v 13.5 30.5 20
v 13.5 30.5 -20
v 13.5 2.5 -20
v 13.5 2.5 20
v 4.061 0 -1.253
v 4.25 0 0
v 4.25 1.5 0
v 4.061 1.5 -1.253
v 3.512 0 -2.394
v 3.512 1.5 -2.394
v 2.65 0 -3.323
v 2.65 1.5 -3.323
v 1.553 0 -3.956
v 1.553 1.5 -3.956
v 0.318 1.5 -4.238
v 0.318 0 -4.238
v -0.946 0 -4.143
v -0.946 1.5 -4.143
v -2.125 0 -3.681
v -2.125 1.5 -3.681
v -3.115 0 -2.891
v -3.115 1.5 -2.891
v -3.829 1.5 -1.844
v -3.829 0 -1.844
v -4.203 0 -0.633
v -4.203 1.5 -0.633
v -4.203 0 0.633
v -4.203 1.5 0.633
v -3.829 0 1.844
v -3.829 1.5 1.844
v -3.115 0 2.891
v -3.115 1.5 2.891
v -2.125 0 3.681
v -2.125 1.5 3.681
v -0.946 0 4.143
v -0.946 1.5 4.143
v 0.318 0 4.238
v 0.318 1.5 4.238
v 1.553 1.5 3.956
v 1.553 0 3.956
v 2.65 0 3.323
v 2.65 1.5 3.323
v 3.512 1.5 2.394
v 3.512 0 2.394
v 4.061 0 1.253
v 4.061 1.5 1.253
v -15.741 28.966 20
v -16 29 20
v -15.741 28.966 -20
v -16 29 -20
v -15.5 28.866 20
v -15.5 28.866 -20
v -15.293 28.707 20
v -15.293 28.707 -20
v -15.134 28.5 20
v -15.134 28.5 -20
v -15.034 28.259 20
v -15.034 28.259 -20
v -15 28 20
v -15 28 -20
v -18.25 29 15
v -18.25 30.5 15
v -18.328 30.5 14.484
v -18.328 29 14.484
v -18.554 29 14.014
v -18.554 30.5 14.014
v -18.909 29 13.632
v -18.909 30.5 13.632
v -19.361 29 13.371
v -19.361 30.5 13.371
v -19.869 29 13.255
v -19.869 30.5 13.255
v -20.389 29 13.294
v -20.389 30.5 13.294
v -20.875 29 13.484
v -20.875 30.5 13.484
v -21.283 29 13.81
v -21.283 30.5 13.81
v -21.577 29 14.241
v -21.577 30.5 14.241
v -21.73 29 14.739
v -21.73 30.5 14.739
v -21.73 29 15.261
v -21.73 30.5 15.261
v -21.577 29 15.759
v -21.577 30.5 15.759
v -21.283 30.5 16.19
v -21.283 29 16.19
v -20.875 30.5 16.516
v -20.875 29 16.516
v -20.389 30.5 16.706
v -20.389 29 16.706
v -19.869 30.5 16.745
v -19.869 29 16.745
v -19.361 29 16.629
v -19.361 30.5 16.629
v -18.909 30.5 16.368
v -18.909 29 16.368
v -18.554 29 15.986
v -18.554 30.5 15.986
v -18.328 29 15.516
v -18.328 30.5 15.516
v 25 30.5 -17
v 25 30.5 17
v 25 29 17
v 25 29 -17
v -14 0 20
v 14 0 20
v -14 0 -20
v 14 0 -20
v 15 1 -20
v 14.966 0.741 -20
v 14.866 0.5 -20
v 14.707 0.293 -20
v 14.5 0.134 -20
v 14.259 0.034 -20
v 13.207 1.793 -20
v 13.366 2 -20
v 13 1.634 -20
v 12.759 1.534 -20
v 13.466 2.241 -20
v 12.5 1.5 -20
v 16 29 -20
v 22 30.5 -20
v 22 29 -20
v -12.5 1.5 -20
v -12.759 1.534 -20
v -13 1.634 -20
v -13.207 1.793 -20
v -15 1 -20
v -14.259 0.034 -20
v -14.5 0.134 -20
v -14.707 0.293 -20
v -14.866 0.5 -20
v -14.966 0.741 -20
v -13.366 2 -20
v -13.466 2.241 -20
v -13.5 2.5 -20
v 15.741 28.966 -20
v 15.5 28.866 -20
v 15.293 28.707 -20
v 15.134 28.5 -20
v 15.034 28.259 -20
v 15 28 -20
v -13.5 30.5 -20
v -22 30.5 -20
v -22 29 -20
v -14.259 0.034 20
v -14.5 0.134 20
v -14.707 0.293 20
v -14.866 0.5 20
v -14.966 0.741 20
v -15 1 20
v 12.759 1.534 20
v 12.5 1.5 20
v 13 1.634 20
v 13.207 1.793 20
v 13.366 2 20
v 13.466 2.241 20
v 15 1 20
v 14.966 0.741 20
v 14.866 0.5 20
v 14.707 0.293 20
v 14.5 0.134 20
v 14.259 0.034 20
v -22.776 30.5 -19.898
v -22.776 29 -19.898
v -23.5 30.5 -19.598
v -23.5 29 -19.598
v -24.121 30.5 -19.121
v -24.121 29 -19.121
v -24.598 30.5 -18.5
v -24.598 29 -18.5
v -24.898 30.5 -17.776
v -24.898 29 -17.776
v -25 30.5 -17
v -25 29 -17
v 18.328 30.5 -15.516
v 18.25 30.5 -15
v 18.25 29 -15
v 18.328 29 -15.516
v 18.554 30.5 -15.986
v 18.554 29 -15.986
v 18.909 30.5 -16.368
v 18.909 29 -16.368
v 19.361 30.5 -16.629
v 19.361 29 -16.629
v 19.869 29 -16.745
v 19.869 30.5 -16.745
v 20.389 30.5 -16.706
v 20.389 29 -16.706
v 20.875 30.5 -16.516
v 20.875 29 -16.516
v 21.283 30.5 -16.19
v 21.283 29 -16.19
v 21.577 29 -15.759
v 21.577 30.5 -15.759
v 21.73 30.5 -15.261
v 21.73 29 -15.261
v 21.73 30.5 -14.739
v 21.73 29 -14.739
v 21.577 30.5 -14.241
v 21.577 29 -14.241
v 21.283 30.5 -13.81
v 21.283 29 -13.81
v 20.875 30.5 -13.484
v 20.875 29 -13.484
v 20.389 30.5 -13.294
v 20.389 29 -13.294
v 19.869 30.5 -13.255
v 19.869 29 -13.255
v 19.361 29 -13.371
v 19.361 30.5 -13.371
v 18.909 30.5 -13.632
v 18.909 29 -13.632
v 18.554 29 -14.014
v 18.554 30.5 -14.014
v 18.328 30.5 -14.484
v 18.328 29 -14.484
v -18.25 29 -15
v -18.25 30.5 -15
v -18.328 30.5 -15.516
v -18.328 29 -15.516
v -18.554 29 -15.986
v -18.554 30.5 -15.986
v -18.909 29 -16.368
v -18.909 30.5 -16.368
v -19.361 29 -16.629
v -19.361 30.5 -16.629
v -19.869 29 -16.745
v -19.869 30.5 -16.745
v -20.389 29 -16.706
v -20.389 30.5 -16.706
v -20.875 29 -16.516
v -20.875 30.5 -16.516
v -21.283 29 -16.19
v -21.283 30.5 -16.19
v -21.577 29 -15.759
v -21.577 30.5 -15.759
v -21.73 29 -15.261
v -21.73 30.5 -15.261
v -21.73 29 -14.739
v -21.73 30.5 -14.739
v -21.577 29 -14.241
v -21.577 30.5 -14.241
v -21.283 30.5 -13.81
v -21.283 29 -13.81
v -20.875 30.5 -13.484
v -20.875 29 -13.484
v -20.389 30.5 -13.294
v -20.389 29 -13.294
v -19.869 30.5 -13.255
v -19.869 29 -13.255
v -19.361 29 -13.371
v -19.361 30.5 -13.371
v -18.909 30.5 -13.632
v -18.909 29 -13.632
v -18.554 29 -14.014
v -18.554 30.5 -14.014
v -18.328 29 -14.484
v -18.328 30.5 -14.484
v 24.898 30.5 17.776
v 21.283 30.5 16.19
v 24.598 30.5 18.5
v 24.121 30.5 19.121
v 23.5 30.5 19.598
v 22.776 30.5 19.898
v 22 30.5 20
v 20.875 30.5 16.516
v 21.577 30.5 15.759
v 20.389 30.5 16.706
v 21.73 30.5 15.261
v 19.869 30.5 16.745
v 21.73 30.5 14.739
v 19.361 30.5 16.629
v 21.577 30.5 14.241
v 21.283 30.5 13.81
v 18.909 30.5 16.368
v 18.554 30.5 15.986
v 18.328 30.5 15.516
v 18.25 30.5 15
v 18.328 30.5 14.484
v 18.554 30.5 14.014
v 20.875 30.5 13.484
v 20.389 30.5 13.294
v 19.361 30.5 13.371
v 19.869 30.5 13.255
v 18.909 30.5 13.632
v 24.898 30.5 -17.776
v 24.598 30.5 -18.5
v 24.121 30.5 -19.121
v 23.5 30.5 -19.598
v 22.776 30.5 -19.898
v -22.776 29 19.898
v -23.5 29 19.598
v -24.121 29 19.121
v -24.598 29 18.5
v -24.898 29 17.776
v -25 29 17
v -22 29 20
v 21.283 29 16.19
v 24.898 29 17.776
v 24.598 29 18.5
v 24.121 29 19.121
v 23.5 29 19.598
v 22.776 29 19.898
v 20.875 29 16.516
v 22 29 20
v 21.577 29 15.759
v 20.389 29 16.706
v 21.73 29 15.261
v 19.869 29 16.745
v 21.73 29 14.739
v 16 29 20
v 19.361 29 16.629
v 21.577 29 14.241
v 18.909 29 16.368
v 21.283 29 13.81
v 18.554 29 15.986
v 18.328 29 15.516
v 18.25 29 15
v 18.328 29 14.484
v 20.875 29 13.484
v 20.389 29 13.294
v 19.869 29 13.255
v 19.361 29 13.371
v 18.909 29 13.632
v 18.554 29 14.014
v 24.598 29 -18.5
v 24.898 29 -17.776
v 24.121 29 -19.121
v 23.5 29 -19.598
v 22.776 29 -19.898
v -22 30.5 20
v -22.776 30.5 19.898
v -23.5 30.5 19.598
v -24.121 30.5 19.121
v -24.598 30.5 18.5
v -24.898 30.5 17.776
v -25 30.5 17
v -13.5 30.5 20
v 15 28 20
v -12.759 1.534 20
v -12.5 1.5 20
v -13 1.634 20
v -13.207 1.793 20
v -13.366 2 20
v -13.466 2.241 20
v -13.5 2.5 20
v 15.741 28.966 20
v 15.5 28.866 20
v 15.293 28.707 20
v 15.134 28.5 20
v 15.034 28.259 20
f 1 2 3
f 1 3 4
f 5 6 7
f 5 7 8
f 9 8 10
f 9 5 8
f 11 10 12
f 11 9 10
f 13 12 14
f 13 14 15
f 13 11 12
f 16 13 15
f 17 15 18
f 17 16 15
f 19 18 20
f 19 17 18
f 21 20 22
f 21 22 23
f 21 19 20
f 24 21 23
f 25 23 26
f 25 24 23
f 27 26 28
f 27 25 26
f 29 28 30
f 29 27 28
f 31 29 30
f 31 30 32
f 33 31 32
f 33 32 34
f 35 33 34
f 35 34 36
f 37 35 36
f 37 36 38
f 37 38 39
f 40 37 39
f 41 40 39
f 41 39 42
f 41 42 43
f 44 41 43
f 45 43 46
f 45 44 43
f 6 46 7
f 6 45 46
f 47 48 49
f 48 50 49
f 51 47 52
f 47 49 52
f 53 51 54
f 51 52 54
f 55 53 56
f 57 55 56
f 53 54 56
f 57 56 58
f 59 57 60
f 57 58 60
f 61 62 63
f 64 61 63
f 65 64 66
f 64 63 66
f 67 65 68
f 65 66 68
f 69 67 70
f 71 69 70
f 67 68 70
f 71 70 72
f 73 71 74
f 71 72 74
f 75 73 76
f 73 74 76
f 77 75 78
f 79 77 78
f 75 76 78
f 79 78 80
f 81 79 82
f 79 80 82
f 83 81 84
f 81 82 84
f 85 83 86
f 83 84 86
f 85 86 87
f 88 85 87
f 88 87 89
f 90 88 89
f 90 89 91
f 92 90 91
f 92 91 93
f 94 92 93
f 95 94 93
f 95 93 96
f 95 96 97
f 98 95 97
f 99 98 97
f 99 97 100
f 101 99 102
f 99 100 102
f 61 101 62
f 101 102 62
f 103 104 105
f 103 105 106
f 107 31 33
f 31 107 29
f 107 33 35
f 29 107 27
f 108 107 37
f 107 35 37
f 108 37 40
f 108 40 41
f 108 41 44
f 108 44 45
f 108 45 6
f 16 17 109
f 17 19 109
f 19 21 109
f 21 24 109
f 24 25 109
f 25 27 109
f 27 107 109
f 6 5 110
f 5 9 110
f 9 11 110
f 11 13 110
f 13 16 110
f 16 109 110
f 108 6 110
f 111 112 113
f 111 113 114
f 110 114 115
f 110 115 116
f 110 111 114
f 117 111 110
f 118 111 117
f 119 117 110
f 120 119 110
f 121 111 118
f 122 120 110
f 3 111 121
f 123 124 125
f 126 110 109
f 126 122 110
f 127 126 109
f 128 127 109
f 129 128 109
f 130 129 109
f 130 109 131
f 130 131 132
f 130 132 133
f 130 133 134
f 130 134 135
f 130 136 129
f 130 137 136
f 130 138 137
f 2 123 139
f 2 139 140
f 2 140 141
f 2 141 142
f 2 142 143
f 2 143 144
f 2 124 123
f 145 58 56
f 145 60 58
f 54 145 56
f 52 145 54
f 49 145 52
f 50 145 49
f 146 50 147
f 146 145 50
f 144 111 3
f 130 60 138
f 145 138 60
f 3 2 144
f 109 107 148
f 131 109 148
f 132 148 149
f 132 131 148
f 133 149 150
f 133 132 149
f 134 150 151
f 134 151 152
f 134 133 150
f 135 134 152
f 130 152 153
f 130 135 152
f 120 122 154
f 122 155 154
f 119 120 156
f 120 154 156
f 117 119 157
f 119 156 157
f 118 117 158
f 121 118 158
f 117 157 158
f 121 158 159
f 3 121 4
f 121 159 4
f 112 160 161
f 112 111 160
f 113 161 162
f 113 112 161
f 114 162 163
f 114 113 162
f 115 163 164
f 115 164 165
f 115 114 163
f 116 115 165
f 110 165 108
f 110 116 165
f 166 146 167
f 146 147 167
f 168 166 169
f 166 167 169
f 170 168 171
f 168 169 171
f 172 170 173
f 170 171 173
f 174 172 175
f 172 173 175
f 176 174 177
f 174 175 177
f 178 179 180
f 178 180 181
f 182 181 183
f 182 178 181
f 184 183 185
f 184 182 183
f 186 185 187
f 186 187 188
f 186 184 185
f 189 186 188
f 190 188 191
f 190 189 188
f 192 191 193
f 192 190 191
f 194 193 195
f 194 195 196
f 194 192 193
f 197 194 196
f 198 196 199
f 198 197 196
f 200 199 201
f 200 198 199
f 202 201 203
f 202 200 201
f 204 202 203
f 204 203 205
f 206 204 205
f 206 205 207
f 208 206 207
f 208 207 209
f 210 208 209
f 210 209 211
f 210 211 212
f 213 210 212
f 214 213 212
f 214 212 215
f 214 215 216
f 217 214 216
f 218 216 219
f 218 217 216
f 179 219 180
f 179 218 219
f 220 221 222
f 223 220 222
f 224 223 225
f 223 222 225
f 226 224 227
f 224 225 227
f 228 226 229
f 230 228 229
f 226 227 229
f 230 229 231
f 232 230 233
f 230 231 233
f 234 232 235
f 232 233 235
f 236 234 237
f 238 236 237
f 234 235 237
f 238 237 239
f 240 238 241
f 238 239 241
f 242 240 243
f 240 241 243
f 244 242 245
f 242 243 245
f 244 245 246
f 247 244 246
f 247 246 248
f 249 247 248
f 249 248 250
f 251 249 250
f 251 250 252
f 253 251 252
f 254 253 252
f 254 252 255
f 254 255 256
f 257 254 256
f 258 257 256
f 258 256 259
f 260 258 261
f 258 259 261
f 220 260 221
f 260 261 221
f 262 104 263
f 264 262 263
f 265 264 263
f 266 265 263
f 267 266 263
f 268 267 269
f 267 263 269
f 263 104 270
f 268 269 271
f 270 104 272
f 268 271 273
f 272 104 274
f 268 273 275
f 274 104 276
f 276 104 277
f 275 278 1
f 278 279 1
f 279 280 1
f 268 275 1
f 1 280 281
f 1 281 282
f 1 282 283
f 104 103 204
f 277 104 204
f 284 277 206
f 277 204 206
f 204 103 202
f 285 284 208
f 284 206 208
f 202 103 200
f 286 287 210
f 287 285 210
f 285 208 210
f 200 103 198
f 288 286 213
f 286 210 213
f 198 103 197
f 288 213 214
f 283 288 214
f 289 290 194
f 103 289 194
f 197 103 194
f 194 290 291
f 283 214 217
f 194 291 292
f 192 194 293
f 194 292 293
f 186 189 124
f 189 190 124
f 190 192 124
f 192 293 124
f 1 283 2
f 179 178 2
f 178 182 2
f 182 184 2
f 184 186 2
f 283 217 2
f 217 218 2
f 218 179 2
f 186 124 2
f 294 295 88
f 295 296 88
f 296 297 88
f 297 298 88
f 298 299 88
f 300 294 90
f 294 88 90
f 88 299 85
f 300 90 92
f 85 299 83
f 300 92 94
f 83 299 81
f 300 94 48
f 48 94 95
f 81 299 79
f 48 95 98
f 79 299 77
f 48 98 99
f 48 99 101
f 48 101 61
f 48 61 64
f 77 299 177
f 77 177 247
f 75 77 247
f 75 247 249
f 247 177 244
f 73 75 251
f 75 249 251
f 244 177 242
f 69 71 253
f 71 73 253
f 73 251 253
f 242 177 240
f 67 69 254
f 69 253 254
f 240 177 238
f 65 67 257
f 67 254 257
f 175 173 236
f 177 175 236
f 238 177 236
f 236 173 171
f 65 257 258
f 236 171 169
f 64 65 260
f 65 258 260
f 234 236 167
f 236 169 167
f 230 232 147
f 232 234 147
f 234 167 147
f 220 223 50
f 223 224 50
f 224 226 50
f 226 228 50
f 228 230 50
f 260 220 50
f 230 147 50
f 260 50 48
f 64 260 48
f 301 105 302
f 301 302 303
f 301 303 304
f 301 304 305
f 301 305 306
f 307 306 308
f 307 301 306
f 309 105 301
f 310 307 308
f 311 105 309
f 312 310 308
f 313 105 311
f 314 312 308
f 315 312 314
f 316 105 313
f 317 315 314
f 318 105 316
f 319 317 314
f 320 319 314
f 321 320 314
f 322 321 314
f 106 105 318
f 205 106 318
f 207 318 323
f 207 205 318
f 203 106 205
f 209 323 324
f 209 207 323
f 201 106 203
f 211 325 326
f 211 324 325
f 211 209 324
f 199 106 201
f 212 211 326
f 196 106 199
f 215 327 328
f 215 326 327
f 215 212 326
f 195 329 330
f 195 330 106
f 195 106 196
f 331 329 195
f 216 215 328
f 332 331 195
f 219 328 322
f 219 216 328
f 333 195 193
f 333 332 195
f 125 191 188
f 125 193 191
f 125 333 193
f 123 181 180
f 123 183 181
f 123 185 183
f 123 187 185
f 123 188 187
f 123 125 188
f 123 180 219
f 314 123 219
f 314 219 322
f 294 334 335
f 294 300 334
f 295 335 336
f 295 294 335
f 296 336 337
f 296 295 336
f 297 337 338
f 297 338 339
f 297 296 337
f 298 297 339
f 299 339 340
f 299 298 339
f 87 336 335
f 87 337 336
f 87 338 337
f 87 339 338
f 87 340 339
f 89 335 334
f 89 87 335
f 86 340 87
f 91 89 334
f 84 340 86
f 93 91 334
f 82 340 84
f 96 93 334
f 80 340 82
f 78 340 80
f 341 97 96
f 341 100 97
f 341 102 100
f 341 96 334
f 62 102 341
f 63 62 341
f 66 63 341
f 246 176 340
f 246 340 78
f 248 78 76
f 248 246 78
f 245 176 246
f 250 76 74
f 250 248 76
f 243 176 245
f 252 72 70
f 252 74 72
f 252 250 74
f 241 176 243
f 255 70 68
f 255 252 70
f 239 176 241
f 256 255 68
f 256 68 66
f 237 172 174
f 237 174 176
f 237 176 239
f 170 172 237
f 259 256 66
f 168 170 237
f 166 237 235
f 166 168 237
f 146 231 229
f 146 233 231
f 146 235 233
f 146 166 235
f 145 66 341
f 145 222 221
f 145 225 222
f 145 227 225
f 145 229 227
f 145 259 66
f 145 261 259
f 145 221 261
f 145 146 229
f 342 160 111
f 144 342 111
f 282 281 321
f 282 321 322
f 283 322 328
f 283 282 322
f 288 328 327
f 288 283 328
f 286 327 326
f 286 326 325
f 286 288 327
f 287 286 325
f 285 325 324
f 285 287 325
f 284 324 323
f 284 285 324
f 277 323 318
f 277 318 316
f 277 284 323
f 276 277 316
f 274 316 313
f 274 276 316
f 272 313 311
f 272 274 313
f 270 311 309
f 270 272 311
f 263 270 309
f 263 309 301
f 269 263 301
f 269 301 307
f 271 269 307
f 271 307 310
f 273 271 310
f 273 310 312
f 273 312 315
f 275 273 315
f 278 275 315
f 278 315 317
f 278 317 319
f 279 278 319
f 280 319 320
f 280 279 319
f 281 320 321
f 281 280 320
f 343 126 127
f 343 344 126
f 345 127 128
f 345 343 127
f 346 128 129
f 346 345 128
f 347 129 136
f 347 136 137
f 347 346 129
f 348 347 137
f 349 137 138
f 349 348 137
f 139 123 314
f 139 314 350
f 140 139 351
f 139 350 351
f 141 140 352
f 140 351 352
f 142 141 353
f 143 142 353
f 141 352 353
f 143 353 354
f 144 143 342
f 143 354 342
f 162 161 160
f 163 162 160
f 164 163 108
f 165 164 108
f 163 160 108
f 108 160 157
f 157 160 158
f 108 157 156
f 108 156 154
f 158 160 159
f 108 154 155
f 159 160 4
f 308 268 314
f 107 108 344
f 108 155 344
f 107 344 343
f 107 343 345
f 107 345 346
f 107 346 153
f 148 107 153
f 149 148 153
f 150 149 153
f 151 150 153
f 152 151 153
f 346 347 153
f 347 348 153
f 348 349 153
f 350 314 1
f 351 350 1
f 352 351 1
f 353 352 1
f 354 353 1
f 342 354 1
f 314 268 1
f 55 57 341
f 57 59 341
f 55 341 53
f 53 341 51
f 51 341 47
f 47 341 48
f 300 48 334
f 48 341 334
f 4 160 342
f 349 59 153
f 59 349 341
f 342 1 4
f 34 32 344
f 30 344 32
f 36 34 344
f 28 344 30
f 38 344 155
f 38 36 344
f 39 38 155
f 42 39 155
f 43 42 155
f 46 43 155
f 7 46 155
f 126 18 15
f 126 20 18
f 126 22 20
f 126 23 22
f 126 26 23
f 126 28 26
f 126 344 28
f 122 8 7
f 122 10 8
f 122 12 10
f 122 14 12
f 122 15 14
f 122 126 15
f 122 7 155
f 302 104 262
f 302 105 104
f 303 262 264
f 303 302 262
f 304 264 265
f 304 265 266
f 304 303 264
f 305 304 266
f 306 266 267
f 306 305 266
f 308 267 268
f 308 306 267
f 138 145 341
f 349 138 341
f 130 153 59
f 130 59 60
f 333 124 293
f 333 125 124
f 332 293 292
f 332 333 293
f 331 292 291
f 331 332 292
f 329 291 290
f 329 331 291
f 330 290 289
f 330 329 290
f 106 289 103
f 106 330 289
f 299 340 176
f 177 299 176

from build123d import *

# Parameters (mm, degrees)
SKETCH1_W           = 30
SKETCH1_H           = 40
SKETCH1_R           = 4.25
BOSS_EXTRUDE1_DEPTH = 1.5
SKETCH2_W           = 40
SKETCH2_H           = 30.5
BOSS_EXTRUDE2_DEPTH = 1.5
SKETCH3_W           = 11.5
SKETCH3_H           = 40
SKETCH3_R           = 1.75
BOSS_EXTRUDE3_DEPTH = 1.5
FILLET1_R           = 1
FILLET2_R           = 3


with BuildPart() as part:
    # Sketch1 → Boss-Extrude1 (new body)
    with BuildSketch(Plane(origin=(0, 0, 0), x_dir=(1, 0, 0), z_dir=(0, 1, 0))):
        Rectangle(SKETCH1_W, SKETCH1_H)
        Circle(SKETCH1_R, mode=Mode.SUBTRACT)
    extrude(amount=BOSS_EXTRUDE1_DEPTH)

    # Sketch2 → Boss-Extrude2 (add)
    with BuildSketch(Plane.ZY.offset(15)):
        with Locations((0, 15.25)):
            Rectangle(SKETCH2_W, SKETCH2_H)
    boss_extrude2 = extrude(amount=-BOSS_EXTRUDE2_DEPTH)

    # Sketch3 → Boss-Extrude3 (add)
    with BuildSketch(Plane(origin=(0, 30.5, 0), x_dir=(1, 0, 0), z_dir=(0, 1, 0))):
        with Locations((-19.25, 0)):
            Rectangle(SKETCH3_W, SKETCH3_H)
        with Locations((-20, 15)):
            Circle(SKETCH3_R, mode=Mode.SUBTRACT)
        with Locations((-20, -15)):
            Circle(SKETCH3_R, mode=Mode.SUBTRACT)
    boss_extrude3 = extrude(amount=-BOSS_EXTRUDE3_DEPTH)

    # Mirror1: Boss-Extrude2, Boss-Extrude3 across plane
    add(boss_extrude2.mirror(Plane(origin=(0, 0, 0), x_dir=(0, 0, 1), z_dir=(1, 0, 0))))
    add(boss_extrude3.mirror(Plane(origin=(0, 0, 0), x_dir=(0, 0, 1), z_dir=(1, 0, 0))))

    # Fillet1
    fillet1_edges = [part.edges().sort_by_distance(p)[0] for p in [
        (-13.5, 1.5, 0),
        (-15, 29, 0),
        (15, 0, 0),
        (-15, 0, 0),
        (13.5, 1.5, 0),
        (15, 29, 0),
    ]]
    fillet(fillet1_edges, radius=FILLET1_R)

    # Fillet2
    fillet2_edges = [part.edges().sort_by_distance(p)[0] for p in [
        (-25, 29.75, -20),
        (-25, 29.75, 20),
        (25, 29.75, 20),
        (25, 29.75, -20),
    ]]
    fillet(fillet2_edges, radius=FILLET2_R)


solid = part.part
